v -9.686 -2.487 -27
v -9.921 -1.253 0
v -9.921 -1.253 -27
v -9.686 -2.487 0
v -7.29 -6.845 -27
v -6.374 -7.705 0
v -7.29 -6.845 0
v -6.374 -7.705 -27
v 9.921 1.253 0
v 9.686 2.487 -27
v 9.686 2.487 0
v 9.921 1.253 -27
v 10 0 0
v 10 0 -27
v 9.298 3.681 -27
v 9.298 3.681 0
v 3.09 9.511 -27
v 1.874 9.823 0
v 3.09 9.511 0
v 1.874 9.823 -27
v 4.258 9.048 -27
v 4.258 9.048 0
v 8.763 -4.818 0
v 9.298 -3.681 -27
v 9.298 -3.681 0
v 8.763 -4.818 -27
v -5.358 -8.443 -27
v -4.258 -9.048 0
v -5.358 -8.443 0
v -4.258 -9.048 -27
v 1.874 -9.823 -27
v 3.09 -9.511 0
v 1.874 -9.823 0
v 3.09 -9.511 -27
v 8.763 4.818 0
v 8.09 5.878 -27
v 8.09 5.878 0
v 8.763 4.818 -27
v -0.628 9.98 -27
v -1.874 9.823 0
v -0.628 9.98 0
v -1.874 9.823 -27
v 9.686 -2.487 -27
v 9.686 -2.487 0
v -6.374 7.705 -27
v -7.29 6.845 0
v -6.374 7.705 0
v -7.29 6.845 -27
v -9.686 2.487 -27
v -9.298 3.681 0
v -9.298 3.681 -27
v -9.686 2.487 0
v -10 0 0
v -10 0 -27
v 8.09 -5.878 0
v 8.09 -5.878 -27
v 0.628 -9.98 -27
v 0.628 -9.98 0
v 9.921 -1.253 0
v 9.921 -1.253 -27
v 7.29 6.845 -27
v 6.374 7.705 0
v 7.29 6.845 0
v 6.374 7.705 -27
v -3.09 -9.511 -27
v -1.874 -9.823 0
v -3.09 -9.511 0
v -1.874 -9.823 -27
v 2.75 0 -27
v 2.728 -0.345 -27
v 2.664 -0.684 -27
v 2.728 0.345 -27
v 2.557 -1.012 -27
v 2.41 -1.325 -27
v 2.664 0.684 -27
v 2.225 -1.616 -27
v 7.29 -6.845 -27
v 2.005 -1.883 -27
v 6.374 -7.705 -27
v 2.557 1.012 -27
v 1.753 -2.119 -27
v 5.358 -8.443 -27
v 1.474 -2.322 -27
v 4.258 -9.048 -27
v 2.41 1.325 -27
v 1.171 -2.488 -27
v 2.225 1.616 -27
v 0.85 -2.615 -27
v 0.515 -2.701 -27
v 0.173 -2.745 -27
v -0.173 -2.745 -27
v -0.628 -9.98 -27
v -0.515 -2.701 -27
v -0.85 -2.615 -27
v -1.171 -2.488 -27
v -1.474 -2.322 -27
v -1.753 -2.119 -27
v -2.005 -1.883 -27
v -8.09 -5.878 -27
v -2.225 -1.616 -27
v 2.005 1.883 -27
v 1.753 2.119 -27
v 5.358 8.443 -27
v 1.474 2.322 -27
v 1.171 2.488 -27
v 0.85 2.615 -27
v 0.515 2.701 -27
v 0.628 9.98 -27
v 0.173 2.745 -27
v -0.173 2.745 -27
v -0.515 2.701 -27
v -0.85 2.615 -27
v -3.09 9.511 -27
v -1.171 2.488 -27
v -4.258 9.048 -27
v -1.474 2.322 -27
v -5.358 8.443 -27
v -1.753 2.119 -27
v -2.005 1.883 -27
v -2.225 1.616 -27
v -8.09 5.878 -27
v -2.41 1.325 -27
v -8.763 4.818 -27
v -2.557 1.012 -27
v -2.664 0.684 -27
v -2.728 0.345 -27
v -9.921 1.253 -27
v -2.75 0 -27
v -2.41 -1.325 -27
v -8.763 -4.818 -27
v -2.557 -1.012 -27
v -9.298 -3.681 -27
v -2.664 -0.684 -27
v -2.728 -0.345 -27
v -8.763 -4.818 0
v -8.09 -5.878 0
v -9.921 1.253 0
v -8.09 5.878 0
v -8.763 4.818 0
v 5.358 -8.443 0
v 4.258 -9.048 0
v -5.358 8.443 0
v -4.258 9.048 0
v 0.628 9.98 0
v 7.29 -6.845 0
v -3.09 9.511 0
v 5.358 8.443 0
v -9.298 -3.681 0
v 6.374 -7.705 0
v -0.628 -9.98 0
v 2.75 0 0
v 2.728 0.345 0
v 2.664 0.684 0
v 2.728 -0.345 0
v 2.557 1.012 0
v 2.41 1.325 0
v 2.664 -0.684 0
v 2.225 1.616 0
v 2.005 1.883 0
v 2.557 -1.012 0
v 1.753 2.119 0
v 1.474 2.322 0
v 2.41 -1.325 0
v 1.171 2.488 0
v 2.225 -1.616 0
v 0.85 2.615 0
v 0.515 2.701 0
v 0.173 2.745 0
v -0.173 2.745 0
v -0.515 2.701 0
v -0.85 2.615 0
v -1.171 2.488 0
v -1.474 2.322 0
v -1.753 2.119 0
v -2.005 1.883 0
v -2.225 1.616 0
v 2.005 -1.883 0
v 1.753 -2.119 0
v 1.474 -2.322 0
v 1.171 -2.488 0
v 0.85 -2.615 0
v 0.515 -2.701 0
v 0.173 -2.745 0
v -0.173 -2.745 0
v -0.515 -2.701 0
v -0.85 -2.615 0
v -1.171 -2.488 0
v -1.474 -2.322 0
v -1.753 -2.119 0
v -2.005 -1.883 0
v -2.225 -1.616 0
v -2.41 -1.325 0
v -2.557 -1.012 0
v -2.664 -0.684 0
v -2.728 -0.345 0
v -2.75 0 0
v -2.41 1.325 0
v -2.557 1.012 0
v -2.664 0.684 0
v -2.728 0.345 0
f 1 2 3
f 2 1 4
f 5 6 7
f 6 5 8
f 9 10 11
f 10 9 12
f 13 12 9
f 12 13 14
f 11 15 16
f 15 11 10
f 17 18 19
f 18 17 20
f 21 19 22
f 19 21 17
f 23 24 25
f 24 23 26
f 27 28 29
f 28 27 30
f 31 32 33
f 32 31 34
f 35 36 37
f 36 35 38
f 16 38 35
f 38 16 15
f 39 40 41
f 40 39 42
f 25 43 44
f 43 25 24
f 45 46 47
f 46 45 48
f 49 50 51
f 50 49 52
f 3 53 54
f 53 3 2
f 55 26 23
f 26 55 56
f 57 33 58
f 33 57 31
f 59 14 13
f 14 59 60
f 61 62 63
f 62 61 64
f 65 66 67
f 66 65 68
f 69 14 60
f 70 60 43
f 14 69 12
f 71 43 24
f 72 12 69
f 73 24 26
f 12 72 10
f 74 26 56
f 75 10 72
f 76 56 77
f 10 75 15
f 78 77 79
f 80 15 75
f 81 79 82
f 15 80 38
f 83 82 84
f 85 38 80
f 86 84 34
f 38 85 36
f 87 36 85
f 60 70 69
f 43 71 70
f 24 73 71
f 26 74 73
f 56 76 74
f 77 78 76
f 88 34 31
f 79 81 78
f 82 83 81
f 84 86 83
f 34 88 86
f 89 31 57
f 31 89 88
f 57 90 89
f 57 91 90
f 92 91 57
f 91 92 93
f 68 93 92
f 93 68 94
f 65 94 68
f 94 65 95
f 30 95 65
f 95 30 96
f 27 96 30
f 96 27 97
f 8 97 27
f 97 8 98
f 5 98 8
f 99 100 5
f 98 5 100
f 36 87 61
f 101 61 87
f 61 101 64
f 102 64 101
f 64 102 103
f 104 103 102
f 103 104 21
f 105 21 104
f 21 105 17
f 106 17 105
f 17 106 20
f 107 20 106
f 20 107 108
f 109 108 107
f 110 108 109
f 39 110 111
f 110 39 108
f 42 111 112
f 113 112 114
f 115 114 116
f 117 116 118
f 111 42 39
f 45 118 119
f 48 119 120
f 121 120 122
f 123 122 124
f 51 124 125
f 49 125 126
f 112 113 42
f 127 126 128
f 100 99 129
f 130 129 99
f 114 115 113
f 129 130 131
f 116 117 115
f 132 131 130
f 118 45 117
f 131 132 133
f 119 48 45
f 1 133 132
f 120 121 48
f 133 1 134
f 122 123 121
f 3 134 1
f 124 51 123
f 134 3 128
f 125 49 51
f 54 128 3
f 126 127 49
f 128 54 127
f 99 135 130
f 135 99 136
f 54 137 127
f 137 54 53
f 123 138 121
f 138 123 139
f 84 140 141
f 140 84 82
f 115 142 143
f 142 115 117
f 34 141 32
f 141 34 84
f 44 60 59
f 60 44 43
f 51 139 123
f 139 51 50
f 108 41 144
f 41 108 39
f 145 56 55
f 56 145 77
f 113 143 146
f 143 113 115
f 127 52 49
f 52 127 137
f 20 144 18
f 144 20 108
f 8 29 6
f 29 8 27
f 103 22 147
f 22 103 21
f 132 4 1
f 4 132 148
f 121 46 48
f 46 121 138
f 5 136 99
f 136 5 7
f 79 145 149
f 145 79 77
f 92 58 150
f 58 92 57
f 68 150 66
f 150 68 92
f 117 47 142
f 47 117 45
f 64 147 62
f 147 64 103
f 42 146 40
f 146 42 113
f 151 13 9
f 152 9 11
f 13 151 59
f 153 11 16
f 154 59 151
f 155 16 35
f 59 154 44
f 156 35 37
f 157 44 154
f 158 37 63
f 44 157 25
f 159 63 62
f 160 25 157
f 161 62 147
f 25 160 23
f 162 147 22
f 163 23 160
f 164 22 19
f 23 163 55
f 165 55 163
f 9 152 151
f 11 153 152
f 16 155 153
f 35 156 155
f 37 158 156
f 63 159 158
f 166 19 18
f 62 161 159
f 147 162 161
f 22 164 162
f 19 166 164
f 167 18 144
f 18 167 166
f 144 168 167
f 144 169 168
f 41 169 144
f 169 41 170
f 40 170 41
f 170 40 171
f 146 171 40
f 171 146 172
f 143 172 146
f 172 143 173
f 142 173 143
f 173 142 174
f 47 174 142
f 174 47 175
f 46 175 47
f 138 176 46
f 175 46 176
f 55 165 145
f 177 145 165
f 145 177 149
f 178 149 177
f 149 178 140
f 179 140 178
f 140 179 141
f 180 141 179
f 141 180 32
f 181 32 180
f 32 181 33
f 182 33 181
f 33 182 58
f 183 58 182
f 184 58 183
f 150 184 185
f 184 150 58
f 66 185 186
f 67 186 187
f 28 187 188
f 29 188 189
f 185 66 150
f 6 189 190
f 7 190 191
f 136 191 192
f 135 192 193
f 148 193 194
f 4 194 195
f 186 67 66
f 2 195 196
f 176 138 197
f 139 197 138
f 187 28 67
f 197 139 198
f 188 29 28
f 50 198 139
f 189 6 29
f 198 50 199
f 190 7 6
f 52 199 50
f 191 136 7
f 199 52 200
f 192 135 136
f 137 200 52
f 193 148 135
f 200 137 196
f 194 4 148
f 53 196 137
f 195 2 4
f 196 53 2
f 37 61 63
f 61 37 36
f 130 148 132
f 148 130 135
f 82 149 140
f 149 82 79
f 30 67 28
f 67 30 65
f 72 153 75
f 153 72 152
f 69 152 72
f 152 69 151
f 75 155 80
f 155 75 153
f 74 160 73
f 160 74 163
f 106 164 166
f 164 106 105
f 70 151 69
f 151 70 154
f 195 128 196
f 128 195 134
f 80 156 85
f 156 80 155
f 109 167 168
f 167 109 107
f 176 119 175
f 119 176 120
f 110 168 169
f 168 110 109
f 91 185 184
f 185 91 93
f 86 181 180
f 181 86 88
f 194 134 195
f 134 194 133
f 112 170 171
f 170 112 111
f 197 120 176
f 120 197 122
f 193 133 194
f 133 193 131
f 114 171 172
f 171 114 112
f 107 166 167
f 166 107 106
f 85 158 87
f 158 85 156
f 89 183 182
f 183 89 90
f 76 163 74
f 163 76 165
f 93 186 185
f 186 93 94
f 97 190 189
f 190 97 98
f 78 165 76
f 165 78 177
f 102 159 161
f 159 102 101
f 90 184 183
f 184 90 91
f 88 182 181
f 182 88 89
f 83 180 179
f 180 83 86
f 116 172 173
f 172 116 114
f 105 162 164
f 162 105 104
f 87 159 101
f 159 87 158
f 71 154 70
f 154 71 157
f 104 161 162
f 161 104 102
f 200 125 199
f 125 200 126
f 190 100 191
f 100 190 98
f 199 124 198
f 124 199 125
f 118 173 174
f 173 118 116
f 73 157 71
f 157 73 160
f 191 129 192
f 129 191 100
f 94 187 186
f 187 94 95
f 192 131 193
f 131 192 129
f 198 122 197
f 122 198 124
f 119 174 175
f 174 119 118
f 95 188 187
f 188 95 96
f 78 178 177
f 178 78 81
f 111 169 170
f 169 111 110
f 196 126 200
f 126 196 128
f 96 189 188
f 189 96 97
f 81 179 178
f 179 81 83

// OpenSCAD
$fn = 50;


difference() {
	union() {
		translate(v = [0, 0, -27.0000000000]) {
			cylinder(h = 27, r = 10.0000000000);
		}
		cylinder(h = 0, r = 16.0000000000);
	}
	union() {
		#translate(v = [0, 0, -27]) {
			cylinder(h = 27, r = 2.7500000000);
		}
	}
}
